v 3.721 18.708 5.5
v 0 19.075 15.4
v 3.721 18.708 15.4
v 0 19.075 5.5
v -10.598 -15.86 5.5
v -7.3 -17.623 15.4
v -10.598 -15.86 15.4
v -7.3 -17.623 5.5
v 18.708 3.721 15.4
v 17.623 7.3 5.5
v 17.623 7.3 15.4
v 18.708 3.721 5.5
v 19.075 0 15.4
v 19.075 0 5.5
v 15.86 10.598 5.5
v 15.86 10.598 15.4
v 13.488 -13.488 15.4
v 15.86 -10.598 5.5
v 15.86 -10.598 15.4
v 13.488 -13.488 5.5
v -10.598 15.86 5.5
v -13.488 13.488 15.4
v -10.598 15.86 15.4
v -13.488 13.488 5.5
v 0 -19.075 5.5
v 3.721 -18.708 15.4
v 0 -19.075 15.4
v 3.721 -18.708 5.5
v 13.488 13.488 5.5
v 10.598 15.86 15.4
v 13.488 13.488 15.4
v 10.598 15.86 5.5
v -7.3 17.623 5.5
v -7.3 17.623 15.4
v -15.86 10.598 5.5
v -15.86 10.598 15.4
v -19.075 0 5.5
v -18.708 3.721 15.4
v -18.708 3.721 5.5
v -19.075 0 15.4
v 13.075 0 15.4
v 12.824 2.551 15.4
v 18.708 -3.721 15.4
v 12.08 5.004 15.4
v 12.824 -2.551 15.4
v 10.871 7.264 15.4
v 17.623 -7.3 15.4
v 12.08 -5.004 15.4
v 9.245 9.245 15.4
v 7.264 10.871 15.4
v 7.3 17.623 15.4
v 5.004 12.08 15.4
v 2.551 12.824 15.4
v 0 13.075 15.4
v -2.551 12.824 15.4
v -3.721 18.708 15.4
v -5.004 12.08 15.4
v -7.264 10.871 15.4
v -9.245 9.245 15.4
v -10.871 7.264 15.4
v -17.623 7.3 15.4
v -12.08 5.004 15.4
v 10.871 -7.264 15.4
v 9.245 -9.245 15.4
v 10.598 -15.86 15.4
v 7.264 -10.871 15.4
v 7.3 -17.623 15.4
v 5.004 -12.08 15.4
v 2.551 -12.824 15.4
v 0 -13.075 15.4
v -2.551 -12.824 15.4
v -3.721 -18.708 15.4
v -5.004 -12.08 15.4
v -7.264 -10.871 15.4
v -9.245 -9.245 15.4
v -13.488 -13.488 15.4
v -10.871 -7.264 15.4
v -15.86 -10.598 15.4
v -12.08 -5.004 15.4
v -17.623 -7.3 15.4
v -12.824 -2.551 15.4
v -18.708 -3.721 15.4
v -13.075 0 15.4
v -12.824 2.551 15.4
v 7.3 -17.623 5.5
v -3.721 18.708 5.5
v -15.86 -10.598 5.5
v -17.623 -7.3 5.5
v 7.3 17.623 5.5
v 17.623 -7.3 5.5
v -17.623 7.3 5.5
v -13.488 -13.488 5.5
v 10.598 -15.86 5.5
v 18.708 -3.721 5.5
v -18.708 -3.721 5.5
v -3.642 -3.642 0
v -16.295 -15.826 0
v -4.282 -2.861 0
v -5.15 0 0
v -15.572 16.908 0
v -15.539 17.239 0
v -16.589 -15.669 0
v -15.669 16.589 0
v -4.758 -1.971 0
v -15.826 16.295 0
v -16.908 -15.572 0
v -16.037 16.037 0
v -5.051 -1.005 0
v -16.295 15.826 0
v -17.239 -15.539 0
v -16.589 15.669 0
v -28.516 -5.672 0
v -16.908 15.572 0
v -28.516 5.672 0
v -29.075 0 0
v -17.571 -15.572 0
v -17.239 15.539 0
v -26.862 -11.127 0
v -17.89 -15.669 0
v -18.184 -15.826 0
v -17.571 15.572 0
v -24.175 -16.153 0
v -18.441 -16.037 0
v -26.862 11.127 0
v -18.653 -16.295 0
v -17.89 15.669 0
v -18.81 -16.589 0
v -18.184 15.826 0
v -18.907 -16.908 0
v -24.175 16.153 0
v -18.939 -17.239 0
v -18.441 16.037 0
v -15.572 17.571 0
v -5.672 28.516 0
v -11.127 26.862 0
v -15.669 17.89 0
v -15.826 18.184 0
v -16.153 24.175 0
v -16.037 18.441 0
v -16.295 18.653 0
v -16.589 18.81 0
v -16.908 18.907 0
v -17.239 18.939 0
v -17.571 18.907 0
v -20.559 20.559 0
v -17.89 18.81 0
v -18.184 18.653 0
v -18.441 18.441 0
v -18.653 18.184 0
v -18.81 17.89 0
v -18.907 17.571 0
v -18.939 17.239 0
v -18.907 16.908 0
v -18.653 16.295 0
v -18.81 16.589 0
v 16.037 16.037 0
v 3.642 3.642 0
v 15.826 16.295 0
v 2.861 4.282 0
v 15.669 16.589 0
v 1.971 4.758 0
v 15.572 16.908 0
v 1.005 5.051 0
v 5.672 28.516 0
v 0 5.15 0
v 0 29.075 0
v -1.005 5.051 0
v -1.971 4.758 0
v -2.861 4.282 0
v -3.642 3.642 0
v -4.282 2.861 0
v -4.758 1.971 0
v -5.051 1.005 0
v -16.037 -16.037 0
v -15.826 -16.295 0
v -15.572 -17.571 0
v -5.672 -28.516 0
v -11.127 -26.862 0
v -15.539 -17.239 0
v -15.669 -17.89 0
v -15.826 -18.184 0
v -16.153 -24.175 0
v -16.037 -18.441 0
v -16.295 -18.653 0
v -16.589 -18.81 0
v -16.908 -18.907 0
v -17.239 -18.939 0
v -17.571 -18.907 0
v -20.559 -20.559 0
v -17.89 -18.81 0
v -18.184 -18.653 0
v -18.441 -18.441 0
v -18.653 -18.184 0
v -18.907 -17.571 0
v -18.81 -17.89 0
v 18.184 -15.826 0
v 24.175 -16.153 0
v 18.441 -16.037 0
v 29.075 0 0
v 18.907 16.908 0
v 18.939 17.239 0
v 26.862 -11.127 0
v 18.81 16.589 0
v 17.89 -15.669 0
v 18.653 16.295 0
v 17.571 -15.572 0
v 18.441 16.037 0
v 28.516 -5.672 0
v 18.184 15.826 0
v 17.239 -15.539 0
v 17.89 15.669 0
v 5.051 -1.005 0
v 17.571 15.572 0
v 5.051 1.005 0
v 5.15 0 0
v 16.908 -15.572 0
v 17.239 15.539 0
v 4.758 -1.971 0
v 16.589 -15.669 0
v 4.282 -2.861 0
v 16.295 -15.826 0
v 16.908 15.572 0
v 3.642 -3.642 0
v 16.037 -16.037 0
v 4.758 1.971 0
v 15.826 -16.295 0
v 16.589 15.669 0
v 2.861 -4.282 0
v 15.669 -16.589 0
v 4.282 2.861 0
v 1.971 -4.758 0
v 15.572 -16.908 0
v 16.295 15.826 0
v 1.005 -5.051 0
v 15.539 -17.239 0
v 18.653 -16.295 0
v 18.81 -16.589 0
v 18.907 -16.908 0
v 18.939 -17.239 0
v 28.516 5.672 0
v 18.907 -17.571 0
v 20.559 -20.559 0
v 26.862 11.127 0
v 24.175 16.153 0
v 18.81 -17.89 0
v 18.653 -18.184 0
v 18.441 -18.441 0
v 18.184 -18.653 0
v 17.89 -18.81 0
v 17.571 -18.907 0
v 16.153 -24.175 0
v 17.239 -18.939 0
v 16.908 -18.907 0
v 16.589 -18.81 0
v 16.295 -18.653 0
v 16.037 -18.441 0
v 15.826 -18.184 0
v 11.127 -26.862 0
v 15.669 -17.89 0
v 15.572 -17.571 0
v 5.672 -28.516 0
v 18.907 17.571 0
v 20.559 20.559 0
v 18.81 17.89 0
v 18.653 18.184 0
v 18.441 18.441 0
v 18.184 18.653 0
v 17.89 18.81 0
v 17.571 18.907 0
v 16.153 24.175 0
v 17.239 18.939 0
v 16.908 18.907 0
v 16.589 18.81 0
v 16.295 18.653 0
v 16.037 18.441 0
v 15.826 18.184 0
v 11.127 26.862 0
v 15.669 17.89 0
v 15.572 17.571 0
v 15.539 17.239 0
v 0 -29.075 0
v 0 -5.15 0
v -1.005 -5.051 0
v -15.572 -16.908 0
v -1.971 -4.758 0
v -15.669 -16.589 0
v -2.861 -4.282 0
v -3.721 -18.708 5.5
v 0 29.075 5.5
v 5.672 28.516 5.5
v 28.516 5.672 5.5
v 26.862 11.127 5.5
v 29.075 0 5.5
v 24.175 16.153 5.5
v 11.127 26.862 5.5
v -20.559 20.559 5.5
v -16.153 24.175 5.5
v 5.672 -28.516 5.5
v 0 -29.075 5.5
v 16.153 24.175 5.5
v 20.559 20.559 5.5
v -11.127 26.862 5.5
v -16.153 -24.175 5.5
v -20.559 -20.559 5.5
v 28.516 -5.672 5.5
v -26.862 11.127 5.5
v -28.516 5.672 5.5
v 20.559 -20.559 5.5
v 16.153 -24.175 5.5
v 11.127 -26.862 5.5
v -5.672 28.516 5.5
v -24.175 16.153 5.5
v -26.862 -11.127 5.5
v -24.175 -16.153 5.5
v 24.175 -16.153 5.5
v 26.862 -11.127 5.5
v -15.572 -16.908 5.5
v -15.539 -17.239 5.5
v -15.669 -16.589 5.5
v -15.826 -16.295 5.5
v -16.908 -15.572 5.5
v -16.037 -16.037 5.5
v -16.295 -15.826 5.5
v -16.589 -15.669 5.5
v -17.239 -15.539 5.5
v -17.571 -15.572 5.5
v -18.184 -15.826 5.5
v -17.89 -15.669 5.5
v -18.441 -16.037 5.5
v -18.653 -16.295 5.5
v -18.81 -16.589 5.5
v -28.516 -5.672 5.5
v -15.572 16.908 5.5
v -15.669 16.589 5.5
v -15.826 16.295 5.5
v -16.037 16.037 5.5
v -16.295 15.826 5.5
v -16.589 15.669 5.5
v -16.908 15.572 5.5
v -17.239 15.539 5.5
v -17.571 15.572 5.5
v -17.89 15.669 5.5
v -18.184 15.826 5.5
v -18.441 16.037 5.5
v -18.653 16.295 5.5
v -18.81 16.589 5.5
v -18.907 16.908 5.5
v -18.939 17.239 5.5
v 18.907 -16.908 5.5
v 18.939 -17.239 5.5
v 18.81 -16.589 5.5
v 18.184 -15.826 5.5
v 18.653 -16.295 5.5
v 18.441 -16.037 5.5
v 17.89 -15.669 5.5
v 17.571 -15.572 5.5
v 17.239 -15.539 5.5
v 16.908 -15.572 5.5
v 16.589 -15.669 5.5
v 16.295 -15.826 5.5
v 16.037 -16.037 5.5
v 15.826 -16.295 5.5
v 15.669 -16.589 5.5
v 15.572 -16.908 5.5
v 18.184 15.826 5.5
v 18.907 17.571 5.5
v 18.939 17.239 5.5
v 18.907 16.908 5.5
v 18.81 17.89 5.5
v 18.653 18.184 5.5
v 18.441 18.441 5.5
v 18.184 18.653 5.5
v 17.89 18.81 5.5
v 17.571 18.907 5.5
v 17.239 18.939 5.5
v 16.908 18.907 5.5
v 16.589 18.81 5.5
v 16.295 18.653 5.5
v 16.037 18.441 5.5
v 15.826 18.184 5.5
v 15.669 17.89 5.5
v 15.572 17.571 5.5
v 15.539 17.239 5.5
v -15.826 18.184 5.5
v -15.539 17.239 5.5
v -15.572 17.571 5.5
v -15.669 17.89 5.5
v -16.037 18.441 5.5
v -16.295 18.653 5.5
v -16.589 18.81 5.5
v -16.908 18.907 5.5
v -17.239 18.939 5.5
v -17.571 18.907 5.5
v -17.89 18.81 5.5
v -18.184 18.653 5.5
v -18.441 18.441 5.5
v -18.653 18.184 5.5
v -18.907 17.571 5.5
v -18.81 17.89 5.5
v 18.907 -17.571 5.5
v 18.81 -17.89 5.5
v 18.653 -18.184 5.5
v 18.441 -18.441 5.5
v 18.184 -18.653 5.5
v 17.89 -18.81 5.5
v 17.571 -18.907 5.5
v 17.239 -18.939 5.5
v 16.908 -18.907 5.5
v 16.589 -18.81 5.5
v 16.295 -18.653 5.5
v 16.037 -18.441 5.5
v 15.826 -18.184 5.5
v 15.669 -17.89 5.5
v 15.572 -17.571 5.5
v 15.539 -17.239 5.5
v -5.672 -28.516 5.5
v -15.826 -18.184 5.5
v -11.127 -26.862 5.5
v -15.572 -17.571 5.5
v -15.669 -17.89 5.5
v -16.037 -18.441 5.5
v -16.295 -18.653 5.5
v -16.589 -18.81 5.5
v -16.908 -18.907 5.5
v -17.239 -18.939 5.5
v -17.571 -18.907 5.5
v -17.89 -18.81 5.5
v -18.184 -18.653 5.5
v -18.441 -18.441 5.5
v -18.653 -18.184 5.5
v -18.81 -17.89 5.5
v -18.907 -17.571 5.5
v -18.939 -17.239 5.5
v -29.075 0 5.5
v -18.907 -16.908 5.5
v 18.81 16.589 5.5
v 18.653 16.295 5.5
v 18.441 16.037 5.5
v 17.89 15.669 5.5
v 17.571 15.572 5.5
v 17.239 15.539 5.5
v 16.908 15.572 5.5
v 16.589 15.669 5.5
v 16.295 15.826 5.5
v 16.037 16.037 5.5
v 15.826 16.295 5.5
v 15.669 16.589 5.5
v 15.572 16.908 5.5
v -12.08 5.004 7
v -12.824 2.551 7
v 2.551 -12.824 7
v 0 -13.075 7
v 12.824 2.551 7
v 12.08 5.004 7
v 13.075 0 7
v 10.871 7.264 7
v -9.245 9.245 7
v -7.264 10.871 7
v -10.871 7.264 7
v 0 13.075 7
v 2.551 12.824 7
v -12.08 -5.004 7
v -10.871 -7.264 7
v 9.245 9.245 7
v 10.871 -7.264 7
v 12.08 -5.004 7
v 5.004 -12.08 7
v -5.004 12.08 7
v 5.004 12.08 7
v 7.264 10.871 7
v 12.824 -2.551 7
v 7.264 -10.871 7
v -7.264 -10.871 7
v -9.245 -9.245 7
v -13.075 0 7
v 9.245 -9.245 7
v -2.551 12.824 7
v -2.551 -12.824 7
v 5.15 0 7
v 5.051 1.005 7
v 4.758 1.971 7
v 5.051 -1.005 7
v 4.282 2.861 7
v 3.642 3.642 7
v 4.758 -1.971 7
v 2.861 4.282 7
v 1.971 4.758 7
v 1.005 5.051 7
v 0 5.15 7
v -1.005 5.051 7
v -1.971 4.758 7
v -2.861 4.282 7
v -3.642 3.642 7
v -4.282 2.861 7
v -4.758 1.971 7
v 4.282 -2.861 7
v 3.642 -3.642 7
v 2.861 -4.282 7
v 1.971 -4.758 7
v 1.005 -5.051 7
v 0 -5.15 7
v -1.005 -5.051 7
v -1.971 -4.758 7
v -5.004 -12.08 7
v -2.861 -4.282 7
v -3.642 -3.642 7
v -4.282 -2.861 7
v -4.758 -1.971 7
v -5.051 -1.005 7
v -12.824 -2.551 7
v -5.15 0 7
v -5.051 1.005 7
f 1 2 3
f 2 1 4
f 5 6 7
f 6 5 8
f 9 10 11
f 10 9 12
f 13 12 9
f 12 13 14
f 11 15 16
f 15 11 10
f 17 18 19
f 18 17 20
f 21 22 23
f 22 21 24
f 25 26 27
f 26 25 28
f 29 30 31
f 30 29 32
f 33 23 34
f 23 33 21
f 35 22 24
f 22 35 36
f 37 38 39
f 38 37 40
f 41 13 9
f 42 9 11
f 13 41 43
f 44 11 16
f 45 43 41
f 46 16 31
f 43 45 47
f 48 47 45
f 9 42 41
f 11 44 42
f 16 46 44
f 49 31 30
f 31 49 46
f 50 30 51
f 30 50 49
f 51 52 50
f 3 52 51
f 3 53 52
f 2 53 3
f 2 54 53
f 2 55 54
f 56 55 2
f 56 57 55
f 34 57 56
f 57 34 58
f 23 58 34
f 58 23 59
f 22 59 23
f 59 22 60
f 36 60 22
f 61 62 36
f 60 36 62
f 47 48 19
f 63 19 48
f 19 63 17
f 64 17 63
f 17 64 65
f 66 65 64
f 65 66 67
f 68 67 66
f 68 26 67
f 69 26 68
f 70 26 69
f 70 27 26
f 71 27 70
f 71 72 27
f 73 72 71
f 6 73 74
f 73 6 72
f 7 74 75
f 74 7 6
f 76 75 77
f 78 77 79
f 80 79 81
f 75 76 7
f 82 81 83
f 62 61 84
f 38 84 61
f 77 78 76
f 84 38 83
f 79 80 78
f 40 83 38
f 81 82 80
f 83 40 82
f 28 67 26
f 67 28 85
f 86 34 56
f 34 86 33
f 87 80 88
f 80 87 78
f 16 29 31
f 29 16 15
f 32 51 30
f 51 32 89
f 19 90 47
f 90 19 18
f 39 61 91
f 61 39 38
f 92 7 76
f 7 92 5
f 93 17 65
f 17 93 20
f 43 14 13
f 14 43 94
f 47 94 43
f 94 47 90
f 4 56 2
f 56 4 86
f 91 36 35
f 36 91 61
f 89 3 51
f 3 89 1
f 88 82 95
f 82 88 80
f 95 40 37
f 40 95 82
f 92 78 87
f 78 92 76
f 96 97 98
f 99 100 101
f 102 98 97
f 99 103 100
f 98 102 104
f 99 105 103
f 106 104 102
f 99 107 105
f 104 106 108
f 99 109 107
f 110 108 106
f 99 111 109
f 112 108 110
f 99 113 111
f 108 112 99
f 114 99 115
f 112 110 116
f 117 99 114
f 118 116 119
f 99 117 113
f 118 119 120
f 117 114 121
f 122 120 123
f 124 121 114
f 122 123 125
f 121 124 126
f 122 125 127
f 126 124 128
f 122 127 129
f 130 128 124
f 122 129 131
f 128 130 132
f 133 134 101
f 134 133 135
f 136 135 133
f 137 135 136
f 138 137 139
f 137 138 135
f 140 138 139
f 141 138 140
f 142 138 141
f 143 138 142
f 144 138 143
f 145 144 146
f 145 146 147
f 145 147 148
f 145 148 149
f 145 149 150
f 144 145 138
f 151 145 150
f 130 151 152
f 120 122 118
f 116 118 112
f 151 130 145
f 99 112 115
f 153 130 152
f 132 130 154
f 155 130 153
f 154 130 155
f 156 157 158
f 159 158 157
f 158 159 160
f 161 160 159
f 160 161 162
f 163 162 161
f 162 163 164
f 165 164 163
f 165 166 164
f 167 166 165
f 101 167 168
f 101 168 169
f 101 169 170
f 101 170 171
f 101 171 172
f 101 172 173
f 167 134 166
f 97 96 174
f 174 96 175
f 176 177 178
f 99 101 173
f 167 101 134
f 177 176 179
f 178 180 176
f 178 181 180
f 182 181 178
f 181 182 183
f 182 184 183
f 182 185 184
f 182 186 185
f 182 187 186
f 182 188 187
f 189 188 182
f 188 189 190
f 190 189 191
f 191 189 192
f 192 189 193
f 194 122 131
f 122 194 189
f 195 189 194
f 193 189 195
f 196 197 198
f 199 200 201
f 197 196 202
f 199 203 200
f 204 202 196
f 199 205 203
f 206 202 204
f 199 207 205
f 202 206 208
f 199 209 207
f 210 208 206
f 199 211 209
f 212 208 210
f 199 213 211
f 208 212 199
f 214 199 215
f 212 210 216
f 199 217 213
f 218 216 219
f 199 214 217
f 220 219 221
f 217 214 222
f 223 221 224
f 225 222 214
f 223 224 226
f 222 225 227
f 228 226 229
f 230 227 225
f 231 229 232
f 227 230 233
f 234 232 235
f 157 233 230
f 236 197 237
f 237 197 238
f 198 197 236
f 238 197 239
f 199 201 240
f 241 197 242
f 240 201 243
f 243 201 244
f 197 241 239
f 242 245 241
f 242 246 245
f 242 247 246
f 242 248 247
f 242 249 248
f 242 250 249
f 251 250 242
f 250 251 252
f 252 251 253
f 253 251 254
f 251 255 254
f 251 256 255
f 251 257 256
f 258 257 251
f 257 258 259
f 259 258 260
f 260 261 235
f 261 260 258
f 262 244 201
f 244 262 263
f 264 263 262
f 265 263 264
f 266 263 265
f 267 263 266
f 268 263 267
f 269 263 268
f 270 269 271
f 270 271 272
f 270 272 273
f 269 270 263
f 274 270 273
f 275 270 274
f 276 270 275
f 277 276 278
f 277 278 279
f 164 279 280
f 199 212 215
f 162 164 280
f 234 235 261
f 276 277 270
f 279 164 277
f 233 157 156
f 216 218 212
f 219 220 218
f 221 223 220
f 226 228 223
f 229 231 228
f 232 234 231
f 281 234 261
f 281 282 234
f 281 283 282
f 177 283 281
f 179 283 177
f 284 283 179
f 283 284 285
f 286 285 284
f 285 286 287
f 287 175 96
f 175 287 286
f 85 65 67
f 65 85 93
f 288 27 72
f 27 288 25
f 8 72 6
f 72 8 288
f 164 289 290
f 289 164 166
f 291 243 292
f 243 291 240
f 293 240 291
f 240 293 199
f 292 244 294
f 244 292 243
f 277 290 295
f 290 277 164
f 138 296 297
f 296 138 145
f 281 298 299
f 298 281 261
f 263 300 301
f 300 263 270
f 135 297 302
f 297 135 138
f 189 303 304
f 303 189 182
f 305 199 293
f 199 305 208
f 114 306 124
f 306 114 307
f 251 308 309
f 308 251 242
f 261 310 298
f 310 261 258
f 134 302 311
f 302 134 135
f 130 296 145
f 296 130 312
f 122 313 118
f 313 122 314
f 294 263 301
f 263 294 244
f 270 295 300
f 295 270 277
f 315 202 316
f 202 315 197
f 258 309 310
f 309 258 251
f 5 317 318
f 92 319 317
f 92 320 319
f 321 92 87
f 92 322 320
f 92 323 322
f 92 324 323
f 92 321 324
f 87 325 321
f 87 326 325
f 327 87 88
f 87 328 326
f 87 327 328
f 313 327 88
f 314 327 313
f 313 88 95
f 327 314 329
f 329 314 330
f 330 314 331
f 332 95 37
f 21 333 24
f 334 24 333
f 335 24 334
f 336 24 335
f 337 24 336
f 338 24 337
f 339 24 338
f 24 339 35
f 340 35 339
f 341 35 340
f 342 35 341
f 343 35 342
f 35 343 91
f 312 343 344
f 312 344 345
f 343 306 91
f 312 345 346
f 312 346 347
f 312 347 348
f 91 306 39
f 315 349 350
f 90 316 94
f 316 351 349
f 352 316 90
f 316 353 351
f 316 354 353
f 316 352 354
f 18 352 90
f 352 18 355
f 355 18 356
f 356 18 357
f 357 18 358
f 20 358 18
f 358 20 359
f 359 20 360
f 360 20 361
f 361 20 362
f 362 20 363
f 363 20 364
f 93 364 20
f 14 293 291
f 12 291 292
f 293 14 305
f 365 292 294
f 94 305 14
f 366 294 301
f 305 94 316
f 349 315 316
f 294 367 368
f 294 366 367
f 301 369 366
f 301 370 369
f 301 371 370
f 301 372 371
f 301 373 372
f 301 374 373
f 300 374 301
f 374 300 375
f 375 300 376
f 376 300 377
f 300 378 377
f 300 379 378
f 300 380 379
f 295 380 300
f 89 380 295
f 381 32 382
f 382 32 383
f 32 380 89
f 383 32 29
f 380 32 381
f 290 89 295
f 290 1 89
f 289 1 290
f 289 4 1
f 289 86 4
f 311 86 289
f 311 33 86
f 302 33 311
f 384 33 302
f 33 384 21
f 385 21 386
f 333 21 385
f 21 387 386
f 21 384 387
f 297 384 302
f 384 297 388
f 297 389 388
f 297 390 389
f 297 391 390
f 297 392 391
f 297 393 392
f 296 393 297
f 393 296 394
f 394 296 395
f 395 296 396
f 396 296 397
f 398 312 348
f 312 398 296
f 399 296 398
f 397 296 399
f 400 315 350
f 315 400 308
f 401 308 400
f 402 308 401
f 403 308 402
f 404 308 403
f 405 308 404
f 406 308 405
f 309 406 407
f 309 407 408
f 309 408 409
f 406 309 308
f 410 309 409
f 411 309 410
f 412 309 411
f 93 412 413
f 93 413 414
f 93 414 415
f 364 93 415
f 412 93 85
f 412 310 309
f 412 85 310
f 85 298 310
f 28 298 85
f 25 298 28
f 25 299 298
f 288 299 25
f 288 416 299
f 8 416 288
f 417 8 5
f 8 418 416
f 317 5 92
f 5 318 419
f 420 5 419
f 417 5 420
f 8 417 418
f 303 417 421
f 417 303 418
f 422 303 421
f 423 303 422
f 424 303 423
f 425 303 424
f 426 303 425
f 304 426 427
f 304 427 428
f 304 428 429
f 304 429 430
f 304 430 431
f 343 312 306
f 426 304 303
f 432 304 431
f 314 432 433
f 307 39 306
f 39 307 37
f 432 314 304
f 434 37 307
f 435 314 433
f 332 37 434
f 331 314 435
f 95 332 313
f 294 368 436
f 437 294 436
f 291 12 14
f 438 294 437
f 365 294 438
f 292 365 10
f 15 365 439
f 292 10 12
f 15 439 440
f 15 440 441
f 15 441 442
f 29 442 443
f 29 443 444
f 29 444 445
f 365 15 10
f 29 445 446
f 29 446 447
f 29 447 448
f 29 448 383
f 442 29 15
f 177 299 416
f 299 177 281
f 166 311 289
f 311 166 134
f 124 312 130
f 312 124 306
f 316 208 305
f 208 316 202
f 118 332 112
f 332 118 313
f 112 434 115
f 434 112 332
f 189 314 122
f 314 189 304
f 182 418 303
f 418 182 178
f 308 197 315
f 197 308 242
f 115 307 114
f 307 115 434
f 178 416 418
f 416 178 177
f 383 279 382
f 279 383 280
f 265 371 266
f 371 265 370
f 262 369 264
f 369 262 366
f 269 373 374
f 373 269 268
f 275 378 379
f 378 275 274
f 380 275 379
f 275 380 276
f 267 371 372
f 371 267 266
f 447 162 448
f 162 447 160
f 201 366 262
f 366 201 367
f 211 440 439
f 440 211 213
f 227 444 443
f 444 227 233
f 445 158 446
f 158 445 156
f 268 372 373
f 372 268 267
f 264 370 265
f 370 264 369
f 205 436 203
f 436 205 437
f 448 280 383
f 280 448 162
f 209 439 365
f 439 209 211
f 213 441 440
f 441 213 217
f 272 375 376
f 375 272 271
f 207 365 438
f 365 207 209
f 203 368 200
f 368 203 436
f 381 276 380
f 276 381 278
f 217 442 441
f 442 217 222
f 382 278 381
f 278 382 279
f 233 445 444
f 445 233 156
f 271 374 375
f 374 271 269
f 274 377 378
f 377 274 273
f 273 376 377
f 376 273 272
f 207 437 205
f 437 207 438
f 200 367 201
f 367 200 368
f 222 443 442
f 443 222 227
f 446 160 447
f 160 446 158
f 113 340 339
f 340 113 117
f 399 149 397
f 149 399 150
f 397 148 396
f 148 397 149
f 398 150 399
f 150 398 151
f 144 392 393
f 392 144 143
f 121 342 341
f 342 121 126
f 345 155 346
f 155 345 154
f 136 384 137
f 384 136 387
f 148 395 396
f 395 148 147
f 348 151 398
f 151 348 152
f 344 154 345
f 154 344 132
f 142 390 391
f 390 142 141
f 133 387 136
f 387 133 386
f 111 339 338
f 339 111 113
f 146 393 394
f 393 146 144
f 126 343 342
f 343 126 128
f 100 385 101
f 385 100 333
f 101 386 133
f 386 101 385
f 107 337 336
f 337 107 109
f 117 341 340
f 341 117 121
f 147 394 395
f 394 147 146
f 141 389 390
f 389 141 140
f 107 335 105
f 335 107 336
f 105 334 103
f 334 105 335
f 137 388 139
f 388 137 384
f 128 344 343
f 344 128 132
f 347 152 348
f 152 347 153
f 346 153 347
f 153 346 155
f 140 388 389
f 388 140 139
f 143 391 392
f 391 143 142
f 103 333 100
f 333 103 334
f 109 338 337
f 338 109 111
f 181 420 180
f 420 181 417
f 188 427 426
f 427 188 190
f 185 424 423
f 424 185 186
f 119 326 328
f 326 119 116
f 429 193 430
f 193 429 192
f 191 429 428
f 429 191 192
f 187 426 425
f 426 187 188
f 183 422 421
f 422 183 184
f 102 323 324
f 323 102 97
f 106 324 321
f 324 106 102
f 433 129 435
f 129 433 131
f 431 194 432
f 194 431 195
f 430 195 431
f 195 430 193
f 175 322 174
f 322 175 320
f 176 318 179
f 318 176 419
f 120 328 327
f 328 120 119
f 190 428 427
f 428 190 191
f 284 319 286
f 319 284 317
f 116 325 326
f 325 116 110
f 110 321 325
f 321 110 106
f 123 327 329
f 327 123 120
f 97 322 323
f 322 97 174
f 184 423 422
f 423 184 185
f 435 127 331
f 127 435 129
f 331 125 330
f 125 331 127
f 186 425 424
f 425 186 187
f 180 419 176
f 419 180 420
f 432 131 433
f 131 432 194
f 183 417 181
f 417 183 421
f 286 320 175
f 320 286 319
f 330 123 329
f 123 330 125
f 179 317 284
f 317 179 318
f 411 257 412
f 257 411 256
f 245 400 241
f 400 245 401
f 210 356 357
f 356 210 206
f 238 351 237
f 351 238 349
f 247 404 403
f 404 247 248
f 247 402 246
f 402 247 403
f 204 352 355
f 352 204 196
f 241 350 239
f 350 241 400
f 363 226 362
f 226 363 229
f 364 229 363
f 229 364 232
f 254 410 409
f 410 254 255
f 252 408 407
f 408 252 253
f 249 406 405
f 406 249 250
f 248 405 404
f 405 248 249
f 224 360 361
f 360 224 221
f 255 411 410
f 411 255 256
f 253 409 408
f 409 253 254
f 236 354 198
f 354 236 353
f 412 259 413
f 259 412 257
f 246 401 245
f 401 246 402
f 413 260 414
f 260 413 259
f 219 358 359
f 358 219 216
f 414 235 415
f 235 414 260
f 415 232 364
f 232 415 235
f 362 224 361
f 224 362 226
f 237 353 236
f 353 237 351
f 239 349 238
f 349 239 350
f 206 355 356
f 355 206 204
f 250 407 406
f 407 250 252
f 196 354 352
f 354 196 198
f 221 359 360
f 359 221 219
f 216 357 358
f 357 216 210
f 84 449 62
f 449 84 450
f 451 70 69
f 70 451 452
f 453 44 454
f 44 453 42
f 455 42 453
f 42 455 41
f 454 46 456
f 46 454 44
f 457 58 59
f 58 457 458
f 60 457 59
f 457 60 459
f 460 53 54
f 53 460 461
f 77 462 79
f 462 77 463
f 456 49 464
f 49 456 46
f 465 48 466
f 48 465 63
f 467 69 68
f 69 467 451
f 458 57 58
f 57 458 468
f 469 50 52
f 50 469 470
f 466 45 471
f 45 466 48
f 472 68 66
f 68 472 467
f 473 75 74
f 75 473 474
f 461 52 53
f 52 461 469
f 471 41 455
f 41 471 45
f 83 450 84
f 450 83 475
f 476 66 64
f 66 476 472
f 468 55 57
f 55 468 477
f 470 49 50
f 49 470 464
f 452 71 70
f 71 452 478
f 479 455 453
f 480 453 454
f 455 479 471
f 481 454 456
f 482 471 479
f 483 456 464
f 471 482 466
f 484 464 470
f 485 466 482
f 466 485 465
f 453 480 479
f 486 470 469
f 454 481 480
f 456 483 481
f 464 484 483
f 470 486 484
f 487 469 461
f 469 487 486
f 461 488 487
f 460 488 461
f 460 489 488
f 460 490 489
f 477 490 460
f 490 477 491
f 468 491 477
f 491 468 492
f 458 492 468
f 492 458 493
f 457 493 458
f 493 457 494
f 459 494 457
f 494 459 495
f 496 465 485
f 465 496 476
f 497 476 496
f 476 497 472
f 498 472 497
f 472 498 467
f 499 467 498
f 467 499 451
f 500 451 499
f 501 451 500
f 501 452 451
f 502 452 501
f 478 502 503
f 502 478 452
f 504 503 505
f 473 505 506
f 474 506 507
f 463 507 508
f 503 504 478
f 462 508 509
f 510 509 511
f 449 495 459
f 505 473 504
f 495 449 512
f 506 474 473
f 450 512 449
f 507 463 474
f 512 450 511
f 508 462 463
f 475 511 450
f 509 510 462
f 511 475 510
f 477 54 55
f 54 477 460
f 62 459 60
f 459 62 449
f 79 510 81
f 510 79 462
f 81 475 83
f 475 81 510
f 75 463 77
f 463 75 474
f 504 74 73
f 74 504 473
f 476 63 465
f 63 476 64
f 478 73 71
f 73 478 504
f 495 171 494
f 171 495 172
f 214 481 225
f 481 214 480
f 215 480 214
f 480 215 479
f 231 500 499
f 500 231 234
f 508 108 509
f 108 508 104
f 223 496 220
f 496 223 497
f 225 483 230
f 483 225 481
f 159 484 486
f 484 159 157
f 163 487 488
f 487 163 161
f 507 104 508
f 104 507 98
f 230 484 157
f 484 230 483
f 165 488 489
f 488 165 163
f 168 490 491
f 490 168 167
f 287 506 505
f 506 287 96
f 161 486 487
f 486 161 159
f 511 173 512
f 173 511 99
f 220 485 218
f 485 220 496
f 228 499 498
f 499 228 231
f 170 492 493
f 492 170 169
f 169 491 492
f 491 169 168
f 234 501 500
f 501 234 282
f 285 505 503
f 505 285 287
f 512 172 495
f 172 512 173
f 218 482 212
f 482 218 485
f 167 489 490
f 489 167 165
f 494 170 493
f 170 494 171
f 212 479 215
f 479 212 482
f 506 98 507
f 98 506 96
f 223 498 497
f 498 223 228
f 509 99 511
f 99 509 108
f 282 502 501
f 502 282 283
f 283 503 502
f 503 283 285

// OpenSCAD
$fn = 32;

// ----------------------------------------------------------------------
// Bearing housing: seat for 6000 (26 x 8 mm), 38.15 mm body
// ----------------------------------------------------------------------

// --- parameters (mm) ---
body_od = 38.15;          // housing outside diameter
body_h = 15.4;            // overall housing height
wall = 6;                 // wall thickness
pocket_d = 26.15;         // 6000 seat, 0.15 mm clearance
seat_h = 8.4;             // pocket depth
shoulder = 3;             // shoulder under the bearing
pass_d = 10.3;            // shaft passage
flange_dia = 58.15;       // mounting flange diameter
flange_t = 4;             // flange thickness
bolt_d = 3.4;             // flange bolt clearance
bolt_r = 24.38;           // flange bolt circle radius

module body() {
  cylinder(h = body_h, d = body_od);
}

module flange() {
  /* flange sunk 1.5 mm into the body */
  cylinder(h = flange_t + 1.5, d = flange_dia);
}

difference() {
  union() {
    body();
    flange();
  }
  translate([0, 0, body_h - seat_h]) cylinder(h = seat_h + 1, d = pocket_d);
  translate([0, 0, -1]) cylinder(h = body_h - seat_h + 1, d = pass_d);
  for (i = [0 : 3]) rotate([0, 0, 45 + i * 90]) translate([bolt_r, 0, -1])
    cylinder(h = flange_t + 3, d = bolt_d);
}
